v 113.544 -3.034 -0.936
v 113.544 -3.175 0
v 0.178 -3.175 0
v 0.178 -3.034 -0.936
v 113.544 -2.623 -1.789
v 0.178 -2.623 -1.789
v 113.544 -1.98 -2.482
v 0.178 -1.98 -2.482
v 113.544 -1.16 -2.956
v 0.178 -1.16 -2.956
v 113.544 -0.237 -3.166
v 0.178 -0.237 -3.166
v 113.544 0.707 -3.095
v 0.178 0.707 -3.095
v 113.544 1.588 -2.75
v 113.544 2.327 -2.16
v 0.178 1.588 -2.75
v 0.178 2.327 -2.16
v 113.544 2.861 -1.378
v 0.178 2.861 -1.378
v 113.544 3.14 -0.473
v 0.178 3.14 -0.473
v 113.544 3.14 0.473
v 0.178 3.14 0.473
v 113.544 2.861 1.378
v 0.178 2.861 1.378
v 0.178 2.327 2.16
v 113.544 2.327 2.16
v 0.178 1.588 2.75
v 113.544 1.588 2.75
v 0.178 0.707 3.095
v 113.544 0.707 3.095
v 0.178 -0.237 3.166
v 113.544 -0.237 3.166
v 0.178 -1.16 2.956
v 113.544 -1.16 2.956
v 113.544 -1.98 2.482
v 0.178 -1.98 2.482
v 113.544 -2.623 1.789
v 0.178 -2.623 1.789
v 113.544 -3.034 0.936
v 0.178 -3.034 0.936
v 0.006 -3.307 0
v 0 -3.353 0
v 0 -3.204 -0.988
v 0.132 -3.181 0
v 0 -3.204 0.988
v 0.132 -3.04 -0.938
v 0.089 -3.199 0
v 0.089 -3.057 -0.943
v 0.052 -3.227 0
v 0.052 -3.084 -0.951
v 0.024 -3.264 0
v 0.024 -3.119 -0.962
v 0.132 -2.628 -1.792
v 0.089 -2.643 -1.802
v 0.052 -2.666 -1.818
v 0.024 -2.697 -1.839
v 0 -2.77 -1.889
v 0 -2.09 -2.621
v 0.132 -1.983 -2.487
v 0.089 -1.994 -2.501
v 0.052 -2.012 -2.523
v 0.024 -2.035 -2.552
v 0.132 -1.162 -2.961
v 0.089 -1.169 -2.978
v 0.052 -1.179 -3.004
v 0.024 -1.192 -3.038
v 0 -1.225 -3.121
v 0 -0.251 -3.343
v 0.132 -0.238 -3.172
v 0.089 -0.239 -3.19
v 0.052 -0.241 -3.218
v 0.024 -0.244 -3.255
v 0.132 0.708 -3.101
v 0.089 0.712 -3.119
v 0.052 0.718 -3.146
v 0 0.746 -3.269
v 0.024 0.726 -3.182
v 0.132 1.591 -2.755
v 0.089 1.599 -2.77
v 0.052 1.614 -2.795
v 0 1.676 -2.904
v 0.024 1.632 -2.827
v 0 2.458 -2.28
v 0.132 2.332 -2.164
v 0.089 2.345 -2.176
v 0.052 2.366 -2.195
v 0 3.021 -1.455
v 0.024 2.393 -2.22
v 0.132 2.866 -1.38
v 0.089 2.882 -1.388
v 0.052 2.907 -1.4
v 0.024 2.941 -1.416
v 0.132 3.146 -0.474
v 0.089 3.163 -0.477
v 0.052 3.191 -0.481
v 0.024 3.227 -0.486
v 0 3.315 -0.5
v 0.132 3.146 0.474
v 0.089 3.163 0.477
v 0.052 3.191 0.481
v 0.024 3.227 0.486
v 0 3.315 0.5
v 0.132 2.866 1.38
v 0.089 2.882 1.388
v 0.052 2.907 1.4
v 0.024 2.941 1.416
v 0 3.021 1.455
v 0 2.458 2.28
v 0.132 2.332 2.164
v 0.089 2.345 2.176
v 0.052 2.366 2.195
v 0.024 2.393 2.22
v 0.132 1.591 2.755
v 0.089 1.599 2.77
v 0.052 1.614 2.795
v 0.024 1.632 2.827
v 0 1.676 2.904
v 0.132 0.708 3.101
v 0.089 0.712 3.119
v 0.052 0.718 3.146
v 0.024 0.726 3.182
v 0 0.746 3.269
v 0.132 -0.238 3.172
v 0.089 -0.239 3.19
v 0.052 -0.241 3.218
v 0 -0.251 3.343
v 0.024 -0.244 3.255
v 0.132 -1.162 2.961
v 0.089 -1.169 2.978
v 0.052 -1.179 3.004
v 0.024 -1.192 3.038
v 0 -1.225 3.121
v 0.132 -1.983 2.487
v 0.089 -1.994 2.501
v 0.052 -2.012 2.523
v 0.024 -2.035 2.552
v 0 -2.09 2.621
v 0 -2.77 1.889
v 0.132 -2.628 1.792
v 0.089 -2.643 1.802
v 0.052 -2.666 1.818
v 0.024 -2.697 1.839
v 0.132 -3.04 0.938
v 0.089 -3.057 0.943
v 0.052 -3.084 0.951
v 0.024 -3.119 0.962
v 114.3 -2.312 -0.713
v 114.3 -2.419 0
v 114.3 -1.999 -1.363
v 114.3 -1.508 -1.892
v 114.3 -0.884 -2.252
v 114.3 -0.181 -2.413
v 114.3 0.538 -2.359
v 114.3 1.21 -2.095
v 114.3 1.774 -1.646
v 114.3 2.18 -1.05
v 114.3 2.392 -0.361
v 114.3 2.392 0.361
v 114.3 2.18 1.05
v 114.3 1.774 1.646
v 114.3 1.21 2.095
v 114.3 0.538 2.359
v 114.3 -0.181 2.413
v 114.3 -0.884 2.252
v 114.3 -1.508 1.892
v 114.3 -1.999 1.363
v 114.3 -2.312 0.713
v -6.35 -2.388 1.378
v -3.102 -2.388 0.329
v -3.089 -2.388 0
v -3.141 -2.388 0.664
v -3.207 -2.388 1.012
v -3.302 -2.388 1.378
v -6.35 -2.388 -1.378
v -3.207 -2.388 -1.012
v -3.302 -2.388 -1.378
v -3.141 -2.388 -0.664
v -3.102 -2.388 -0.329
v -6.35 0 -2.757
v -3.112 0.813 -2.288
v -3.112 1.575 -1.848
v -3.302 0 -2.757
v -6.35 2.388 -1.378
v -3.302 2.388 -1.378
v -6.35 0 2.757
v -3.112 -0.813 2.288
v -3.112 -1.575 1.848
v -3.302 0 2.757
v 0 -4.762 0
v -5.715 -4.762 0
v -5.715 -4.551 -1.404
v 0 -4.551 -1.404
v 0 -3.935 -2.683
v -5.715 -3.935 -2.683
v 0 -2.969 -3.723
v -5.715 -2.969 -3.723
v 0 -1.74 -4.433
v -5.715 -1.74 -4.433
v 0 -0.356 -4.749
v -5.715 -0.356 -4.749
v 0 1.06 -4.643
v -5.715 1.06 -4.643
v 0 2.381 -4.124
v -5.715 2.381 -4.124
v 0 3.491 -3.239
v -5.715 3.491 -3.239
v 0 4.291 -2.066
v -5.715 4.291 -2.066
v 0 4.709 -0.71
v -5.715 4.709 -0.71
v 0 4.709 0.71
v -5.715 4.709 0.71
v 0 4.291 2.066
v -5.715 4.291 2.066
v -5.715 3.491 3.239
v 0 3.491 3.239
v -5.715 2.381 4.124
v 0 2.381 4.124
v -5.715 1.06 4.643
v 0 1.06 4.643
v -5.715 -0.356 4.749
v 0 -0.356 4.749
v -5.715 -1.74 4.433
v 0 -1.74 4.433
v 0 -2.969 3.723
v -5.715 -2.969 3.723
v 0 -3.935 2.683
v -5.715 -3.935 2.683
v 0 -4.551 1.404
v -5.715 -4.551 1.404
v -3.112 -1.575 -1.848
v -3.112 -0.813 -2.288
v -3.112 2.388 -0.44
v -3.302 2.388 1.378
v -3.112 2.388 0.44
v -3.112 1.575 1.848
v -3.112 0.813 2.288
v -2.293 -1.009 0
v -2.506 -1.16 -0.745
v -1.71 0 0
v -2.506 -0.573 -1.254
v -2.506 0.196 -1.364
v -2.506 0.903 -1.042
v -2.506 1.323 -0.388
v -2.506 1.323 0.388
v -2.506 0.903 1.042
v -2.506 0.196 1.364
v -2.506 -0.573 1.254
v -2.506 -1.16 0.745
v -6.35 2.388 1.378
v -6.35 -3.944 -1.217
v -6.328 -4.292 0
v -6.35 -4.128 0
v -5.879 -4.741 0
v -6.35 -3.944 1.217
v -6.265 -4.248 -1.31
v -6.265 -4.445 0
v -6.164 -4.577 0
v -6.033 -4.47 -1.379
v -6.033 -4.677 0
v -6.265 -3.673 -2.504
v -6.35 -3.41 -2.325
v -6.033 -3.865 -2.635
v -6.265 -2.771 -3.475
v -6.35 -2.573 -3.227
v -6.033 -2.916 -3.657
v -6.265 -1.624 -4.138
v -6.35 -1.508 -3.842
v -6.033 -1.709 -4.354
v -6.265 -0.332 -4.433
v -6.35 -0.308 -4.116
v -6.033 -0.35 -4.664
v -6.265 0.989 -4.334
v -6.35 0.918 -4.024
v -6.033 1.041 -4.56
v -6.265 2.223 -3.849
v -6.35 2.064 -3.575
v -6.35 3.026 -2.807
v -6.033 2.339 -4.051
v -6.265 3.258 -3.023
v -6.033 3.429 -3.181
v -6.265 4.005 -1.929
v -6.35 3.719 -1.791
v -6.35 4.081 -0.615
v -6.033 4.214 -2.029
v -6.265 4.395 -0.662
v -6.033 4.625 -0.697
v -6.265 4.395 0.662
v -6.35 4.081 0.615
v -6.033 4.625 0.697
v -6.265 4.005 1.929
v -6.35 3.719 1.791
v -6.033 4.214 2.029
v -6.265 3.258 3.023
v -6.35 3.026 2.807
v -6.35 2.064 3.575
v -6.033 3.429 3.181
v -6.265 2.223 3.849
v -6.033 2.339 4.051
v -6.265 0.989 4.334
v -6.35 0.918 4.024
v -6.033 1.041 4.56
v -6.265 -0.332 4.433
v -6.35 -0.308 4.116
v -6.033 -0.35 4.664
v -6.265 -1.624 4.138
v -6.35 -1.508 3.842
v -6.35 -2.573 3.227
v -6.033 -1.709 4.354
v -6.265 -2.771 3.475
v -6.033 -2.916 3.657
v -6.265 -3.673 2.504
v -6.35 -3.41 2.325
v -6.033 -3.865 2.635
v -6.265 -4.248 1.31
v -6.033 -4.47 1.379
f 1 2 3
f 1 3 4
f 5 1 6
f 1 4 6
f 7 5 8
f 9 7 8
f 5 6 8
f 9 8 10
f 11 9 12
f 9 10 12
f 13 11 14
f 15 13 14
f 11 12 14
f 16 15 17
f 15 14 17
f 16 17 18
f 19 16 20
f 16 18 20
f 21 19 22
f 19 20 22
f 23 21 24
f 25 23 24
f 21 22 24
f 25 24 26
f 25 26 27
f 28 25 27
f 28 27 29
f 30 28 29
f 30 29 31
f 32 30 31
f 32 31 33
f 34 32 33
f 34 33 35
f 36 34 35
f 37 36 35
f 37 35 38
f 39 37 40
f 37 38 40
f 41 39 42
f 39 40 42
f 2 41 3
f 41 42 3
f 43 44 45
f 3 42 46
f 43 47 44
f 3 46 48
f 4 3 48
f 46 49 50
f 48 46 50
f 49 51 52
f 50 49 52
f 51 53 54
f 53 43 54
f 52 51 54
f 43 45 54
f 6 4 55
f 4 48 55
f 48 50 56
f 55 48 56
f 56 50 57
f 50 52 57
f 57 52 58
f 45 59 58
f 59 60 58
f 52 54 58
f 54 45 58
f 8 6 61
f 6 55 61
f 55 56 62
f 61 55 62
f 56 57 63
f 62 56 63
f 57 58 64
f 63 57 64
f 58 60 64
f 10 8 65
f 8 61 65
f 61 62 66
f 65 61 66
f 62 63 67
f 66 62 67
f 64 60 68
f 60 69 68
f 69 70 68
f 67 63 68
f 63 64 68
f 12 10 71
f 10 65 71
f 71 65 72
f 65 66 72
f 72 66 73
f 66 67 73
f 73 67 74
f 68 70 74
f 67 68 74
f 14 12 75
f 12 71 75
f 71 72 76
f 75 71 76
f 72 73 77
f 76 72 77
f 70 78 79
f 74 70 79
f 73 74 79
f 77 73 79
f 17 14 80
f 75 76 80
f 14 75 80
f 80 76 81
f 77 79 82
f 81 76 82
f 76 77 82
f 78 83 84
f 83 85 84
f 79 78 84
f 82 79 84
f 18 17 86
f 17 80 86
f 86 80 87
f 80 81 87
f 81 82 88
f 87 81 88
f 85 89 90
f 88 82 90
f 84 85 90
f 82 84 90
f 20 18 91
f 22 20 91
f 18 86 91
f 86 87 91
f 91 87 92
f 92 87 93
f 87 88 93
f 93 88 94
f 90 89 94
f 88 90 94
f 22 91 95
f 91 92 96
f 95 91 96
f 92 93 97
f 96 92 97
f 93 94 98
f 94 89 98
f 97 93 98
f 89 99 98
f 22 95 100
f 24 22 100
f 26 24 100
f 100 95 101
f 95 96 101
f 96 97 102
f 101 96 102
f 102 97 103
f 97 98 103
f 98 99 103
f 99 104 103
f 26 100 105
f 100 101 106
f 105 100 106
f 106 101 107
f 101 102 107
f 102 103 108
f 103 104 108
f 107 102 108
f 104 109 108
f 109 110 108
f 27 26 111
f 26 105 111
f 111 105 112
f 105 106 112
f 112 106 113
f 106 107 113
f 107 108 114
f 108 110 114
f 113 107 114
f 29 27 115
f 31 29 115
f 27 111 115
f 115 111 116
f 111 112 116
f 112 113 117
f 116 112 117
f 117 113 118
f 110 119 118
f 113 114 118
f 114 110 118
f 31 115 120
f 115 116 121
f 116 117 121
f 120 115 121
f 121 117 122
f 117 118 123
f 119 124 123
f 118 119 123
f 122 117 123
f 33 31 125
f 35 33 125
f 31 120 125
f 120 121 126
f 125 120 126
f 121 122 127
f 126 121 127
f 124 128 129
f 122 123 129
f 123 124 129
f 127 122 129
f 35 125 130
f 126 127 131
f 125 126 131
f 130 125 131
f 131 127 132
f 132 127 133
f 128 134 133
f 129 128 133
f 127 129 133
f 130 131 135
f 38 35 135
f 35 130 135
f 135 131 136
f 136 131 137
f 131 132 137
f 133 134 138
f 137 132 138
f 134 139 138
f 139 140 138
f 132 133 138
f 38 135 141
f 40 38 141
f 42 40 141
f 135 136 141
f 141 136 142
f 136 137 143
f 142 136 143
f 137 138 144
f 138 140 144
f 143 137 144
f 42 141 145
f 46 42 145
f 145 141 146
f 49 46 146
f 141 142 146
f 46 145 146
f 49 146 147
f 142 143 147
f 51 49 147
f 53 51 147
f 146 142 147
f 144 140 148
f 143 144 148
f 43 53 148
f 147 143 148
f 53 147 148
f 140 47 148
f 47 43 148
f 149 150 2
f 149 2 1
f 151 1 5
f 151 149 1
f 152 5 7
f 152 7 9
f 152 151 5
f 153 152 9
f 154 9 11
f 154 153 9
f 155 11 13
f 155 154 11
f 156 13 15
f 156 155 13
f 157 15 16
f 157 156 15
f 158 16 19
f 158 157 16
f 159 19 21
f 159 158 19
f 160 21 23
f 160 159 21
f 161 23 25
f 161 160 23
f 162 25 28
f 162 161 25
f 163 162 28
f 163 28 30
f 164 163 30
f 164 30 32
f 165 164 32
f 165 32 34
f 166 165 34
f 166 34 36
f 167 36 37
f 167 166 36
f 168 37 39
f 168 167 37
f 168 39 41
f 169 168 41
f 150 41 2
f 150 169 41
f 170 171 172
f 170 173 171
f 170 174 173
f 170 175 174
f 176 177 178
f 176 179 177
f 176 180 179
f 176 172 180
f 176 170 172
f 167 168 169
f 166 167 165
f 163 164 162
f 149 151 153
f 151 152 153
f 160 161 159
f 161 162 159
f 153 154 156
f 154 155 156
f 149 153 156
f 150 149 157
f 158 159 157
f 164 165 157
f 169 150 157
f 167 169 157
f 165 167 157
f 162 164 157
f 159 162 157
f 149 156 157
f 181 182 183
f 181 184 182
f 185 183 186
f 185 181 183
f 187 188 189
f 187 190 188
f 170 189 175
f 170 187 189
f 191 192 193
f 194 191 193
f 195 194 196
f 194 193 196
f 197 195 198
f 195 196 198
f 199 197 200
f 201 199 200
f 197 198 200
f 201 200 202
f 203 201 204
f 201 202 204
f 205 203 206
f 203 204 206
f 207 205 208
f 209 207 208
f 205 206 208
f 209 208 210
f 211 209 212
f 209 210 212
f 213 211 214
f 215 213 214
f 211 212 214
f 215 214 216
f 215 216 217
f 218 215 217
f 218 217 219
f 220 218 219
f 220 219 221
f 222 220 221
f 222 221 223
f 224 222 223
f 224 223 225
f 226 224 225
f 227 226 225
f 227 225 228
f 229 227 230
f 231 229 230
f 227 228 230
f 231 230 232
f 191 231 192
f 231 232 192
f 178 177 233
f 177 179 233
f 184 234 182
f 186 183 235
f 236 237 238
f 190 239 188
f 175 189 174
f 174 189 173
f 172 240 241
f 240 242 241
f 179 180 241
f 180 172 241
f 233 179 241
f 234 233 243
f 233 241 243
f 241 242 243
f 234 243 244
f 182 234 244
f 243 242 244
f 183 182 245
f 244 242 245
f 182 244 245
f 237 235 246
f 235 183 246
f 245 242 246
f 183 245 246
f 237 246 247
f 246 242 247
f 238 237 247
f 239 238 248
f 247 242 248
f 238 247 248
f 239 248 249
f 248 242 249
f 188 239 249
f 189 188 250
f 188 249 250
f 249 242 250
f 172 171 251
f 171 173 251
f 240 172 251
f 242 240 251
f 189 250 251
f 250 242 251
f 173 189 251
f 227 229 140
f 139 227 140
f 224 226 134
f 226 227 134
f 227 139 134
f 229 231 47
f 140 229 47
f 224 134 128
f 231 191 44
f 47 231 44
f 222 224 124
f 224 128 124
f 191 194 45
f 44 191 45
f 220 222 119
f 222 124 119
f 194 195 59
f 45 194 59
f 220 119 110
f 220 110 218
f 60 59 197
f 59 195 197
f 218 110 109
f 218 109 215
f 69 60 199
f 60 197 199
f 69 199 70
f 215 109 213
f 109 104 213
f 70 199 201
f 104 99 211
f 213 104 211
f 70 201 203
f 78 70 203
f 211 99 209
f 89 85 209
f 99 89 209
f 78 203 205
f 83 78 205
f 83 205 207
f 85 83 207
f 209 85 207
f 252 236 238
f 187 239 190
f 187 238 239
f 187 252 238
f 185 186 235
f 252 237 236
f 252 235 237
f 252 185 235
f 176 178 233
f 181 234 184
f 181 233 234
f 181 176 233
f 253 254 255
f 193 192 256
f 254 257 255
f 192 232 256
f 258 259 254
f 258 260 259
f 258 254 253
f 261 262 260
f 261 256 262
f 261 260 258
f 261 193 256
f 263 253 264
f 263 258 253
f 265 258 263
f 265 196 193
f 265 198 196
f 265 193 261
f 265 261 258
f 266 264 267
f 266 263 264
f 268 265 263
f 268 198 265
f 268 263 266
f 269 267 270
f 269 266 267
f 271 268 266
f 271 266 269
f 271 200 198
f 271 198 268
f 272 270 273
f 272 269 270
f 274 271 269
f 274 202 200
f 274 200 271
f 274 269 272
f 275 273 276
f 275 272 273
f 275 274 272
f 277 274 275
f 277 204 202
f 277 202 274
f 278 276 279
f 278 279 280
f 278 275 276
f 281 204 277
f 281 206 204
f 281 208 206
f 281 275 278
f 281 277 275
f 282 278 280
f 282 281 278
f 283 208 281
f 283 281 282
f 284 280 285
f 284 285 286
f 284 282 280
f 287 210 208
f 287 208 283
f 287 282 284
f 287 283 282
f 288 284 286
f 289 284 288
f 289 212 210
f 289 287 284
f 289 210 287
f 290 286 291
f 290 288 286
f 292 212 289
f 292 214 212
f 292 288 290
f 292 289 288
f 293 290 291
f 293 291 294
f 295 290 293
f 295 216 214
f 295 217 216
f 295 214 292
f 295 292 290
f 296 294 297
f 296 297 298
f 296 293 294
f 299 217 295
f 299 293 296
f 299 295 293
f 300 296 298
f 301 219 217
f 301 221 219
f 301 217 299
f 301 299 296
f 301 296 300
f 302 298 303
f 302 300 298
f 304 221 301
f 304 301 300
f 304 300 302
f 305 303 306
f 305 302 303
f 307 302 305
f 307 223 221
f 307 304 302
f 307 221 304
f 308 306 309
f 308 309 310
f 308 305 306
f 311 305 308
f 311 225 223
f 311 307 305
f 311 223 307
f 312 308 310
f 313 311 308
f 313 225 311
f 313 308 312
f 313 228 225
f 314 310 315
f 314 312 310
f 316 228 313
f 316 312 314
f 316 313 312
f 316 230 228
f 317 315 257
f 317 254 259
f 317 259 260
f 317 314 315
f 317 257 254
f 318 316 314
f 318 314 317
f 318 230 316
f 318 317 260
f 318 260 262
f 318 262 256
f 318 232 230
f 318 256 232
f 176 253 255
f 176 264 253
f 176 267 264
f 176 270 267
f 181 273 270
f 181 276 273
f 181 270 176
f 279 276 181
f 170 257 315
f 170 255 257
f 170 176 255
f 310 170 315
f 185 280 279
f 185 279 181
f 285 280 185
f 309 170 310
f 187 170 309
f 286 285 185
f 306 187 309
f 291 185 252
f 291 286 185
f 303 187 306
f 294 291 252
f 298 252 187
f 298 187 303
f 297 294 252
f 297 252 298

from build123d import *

# Parameters (mm, degrees)
SLOT_REACH    = 122.838
THREAD_R      = 0.635
CHAMFER1_SIZE = 0.75565
FILLET2_R     = 0.1778


with BuildPart() as part:
    # Sketch1 → Body (revolve)
    with BuildSketch(Plane.XY, mode=Mode.PRIVATE) as body_sk:
        Polygon((-1.710266667, 0), (114.3, 0), (114.3, 3.175), (88.9, 3.175), (85.7249, 3.175), (0, 3.175), (0, 4.7625), (-6.35, 4.7625), (-6.35, 2.756963005), (-3.302, 2.756963005), align=None)
    revolve(body_sk.sketch.rotate(Axis((-1.710266667, 0, 0), (1, 0, 0)), 180), axis=Axis((-1.710266667, 0, 0), (1, 0, 0)))

    # Slot: up to this cone (the profile starts inside it)
    slot_end = Plane(origin=(-6.35, 0, 0), z_dir=(-1, 0, 0)).offset(-4.639732333) * Cone(1.732e-06, 235.583136371, 136.0139862, align=(Align.CENTER, Align.CENTER, Align.MIN), mode=Mode.PRIVATE)
    # Sketch2 → Slot (add, up to the surface)
    with BuildSketch(Plane.ZY.offset(6.35), mode=Mode.PRIVATE) as slot_sk1:
        with BuildLine():
            ThreePointArc((1.378481503, -2.3876), (2.3876, -1.378481503), (2.756963005, 0))
            Line((2.756963005, 0), (1.378481503, -2.3876))
        make_face()
    slot_tool1 = extrude(slot_sk1.sketch, amount=-SLOT_REACH, mode=Mode.PRIVATE) & slot_end
    add(slot_tool1.solids().sort_by_distance((-6.35, -1.268114, 2.196438))[0])
    # Sketch2 → Slot (add, up to the surface)
    with BuildSketch(Plane.ZY.offset(6.35), mode=Mode.PRIVATE) as slot_sk2:
        with BuildLine():
            ThreePointArc((-1.378481503, -2.3876), (0, -2.756963005), (1.378481503, -2.3876))
            Line((1.378481503, -2.3876), (-1.378481503, -2.3876))
        make_face()
    slot_tool2 = extrude(slot_sk2.sketch, amount=-SLOT_REACH, mode=Mode.PRIVATE) & slot_end
    add(slot_tool2.solids().sort_by_distance((-6.35, -2.536228, 0))[0])
    # Sketch2 → Slot (add, up to the surface)
    with BuildSketch(Plane.ZY.offset(6.35), mode=Mode.PRIVATE) as slot_sk3:
        with BuildLine():
            ThreePointArc((-2.756963005, 0), (-2.3876, -1.378481503), (-1.378481503, -2.3876))
            Line((-1.378481503, -2.3876), (-2.756963005, 0))
        make_face()
    slot_tool3 = extrude(slot_sk3.sketch, amount=-SLOT_REACH, mode=Mode.PRIVATE) & slot_end
    add(slot_tool3.solids().sort_by_distance((-6.35, -1.268114, -2.196438))[0])
    # Sketch2 → Slot (add, up to the surface)
    with BuildSketch(Plane.ZY.offset(6.35), mode=Mode.PRIVATE) as slot_sk4:
        with BuildLine():
            Line((-2.756963005, 0), (-1.378481503, 2.3876))
            ThreePointArc((-1.378481503, 2.3876), (-2.3876, 1.378481503), (-2.756963005, 0))
        make_face()
    slot_tool4 = extrude(slot_sk4.sketch, amount=-SLOT_REACH, mode=Mode.PRIVATE) & slot_end
    add(slot_tool4.solids().sort_by_distance((-6.35, 1.268114, -2.196438))[0])
    # Sketch2 → Slot (add, up to the surface)
    with BuildSketch(Plane.ZY.offset(6.35), mode=Mode.PRIVATE) as slot_sk5:
        with BuildLine():
            Line((-1.378481503, 2.3876), (1.378481503, 2.3876))
            ThreePointArc((1.378481503, 2.3876), (0, 2.756963005), (-1.378481503, 2.3876))
        make_face()
    slot_tool5 = extrude(slot_sk5.sketch, amount=-SLOT_REACH, mode=Mode.PRIVATE) & slot_end
    add(slot_tool5.solids().sort_by_distance((-6.35, 2.536228, 0))[0])
    # Sketch2 → Slot (add, up to the surface)
    with BuildSketch(Plane.ZY.offset(6.35), mode=Mode.PRIVATE) as slot_sk6:
        with BuildLine():
            Line((1.378481503, 2.3876), (2.756963005, 0))
            ThreePointArc((2.756963005, 0), (2.3876, 1.378481503), (1.378481503, 2.3876))
        make_face()
    slot_tool6 = extrude(slot_sk6.sketch, amount=-SLOT_REACH, mode=Mode.PRIVATE) & slot_end
    add(slot_tool6.solids().sort_by_distance((-6.35, 1.268114, 2.196438))[0])

    # Thread
    thread_edges = [part.edges().sort_by_distance(p)[0] for p in [
        (-6.35, 4.7625, 0),
    ]]
    fillet(thread_edges, radius=THREAD_R)

    # Chamfer1
    chamfer1_edges = [part.edges().sort_by_distance(p)[0] for p in [
        (114.3, 3.175, 0),
    ]]
    chamfer(chamfer1_edges, length=CHAMFER1_SIZE)

    # Fillet2
    fillet2_edges = [part.edges().sort_by_distance(p)[0] for p in [
        (0, 3.175, 0),
    ]]
    fillet(fillet2_edges, radius=FILLET2_R)


solid = part.part
